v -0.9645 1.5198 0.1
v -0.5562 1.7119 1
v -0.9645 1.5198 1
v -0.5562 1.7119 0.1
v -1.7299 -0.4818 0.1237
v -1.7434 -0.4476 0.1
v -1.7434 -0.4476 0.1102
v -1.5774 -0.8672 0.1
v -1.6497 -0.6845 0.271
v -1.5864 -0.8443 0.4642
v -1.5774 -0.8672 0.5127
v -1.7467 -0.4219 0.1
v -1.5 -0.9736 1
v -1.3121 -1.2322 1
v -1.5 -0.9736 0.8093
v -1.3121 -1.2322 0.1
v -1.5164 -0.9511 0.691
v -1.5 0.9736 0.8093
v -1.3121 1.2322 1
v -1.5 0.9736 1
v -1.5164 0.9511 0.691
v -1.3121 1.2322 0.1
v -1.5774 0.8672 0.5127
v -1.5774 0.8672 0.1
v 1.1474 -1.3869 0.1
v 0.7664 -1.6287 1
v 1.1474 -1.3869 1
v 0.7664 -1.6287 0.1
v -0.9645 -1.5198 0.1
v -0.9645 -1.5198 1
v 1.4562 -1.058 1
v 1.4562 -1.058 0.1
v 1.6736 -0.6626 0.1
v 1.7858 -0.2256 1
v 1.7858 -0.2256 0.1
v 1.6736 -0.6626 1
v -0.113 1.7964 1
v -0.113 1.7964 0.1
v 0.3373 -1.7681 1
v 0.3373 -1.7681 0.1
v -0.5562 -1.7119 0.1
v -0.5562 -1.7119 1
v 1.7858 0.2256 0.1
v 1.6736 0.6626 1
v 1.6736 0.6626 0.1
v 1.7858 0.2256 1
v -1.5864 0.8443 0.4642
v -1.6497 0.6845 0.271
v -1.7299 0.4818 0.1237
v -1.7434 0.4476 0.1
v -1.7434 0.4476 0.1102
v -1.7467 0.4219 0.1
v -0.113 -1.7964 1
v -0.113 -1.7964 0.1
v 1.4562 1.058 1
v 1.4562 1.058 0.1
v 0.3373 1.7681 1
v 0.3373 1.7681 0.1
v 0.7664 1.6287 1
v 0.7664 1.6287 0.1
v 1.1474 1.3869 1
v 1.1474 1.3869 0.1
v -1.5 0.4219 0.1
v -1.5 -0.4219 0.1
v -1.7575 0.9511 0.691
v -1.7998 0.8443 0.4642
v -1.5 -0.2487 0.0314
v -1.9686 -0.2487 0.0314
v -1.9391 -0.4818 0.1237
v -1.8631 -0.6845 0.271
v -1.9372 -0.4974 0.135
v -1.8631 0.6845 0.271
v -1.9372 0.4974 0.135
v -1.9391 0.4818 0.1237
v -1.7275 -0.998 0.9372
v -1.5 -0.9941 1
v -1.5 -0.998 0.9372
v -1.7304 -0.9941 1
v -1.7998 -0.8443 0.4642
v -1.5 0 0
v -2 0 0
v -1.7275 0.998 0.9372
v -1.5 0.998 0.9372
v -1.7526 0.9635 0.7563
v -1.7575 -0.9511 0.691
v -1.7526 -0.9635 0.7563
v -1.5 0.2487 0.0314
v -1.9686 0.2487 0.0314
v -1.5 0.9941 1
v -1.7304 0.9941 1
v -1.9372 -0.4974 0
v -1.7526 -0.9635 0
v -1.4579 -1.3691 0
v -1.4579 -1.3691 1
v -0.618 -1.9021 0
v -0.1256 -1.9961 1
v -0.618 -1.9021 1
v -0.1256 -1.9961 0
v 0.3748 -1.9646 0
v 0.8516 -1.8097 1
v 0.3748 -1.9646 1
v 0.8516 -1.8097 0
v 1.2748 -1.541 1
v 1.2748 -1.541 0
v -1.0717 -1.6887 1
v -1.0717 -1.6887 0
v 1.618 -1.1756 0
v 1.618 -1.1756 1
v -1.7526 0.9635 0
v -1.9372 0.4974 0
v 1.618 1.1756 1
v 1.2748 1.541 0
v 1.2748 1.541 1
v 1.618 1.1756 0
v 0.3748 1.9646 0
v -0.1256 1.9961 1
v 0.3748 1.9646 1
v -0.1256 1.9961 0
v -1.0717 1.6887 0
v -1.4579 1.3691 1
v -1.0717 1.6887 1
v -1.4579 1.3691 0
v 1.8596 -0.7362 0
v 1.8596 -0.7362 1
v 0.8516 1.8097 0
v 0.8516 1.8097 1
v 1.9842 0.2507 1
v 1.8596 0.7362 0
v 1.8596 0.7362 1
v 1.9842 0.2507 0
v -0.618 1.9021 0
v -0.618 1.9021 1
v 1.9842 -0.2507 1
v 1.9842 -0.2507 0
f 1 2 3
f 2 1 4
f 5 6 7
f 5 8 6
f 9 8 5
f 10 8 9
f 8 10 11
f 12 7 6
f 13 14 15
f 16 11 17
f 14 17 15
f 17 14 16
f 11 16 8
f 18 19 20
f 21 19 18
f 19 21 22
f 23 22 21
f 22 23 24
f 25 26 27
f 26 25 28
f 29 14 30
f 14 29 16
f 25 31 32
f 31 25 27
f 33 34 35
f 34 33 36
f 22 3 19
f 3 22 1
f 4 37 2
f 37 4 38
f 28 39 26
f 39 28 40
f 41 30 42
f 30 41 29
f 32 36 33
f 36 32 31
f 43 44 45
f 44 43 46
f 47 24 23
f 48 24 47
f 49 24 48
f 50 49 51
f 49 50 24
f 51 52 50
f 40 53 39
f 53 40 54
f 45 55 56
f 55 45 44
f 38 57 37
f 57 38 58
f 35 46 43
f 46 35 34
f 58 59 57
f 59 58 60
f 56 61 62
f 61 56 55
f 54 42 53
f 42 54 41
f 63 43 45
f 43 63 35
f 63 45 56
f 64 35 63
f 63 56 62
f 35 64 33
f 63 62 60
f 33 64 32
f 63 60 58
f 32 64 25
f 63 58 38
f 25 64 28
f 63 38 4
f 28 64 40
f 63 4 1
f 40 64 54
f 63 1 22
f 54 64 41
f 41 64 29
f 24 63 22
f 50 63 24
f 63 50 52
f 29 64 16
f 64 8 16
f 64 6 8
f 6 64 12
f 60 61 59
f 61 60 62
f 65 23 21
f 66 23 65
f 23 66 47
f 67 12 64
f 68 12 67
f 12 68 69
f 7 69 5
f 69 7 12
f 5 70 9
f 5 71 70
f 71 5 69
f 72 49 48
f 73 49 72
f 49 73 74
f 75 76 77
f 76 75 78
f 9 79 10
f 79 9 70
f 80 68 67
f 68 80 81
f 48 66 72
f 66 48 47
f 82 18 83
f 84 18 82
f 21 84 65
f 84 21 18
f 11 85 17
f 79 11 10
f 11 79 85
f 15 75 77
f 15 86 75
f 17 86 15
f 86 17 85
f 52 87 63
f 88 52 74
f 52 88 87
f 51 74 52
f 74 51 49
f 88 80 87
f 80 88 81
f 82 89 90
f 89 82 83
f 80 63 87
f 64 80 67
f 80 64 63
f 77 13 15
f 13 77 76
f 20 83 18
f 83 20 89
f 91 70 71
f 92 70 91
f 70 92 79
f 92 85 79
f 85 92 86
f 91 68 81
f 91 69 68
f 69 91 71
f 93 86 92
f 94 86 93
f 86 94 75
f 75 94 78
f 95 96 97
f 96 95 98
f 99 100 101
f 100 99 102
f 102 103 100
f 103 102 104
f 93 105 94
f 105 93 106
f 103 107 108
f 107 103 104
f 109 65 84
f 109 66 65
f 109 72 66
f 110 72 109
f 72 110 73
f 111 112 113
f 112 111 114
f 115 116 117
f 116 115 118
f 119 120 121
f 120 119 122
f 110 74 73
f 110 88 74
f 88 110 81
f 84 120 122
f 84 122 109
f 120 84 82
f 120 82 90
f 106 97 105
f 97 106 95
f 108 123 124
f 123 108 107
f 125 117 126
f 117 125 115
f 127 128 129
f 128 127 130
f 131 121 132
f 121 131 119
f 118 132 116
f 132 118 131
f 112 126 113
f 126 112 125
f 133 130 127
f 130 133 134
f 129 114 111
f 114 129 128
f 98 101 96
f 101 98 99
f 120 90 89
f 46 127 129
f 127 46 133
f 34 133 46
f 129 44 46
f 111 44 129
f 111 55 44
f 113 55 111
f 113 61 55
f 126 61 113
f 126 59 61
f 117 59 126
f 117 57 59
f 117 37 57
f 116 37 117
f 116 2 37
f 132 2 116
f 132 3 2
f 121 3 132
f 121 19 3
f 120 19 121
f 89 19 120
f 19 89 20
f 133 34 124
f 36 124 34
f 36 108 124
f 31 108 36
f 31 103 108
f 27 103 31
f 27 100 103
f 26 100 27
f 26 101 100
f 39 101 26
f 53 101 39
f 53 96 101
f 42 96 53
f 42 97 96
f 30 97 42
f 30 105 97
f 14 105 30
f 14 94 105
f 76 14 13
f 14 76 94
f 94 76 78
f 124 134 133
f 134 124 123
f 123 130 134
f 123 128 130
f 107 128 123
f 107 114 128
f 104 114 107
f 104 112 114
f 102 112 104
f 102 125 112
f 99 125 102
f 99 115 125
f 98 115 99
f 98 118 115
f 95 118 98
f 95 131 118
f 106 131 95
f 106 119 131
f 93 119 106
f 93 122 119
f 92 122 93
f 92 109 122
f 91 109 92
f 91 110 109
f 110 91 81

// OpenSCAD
module container(h=1,r=1,angle=0,$fn=$fn){
    rotate([0,0,angle])
    difference(){
        cylinder(h,r=r*2);
        union(){
            translate([0,0,0.1])
            cylinder(h+1,r=r*2*0.9);
            translate([r*1.5,0,h])
            rotate([0,90,0])
            cylinder(r=r);
        }
    }
}


container(1,1,180,25);
